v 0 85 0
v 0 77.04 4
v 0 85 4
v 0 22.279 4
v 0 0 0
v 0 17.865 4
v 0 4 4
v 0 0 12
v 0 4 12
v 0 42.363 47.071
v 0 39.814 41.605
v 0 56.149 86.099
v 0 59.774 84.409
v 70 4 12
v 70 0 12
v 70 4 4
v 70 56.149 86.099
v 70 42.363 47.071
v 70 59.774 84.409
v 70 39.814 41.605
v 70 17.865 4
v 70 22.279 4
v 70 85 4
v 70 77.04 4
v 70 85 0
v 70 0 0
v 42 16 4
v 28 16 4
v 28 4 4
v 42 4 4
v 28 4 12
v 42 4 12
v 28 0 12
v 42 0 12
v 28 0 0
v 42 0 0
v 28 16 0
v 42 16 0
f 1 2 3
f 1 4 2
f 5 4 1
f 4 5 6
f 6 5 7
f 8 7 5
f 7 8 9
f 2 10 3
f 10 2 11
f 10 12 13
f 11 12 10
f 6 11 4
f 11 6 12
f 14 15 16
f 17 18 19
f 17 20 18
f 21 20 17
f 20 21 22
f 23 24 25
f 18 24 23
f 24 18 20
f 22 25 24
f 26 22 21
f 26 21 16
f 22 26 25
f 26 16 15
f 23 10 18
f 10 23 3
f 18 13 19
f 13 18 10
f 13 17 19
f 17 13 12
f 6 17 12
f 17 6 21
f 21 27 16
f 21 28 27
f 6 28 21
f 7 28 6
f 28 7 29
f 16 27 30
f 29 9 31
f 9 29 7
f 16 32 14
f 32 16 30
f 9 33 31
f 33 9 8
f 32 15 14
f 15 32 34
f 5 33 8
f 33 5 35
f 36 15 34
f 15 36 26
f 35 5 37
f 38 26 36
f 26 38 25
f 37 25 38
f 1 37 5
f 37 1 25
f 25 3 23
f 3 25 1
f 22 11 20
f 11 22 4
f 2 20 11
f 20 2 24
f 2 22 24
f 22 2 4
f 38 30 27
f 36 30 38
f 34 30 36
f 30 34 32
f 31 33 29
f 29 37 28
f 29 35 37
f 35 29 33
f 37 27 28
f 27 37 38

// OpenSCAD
// Phone stand: leans the phone back at a comfortable angle, with a slot for the charging cable.
// Printed on its side? No: printed as shown, base flat on the bed.

/* [Size] */
// Width (mm)
width = 70; // [50:1:120]
// Base depth (mm)
depth = 85; // [60:1:130]
// Lean angle (°)
angle = 65; // [50:1:80]
// Back rest length (mm)
rest_len = 95; // [60:1:140]

/* [Phone] */
// Phone with case (mm)
phone_thickness = 12; // [7:0.5:20]
// Front lip (mm)
lip_height = 12; // [6:1:25]
// Cable slot (0 = none)
cable_slot = 14; // [0:1:24]

/* [Strength] */
// Wall thickness (mm)
thickness = 4; // [3:0.5:8]

/* [Hidden] */
$fn = $preview ? 24 : 48;
s = thickness + phone_thickness; // where the back rest starts

module profile() {
  // base
  square([depth, thickness]);
  // front lip
  square([thickness, lip_height]);
  // back rest
  translate([s, 0]) rotate(angle) translate([0, -thickness]) square([rest_len, thickness]);
  // brace from the back of the base up to the back rest
  hull() {
    translate([depth - thickness, 0]) square([thickness, thickness]);
    translate([s + 0.55 * rest_len * cos(angle), 0.55 * rest_len * sin(angle) - thickness]) square([thickness, thickness]);
  }
}

difference() {
  // clip to the desk plane: the tilted back rest would otherwise dip below the base
  rotate([90, 0, 90]) linear_extrude(width) intersection() {
    profile();
    translate([-1, 0]) square([depth + rest_len + 2, rest_len + lip_height + 2]);
  }
  // cable slot through the lip and the front of the base
  if (cable_slot > 0)
    translate([(width - cable_slot) / 2, -1, -1]) cube([cable_slot, s + 1, thickness + lip_height + 2]);
}
